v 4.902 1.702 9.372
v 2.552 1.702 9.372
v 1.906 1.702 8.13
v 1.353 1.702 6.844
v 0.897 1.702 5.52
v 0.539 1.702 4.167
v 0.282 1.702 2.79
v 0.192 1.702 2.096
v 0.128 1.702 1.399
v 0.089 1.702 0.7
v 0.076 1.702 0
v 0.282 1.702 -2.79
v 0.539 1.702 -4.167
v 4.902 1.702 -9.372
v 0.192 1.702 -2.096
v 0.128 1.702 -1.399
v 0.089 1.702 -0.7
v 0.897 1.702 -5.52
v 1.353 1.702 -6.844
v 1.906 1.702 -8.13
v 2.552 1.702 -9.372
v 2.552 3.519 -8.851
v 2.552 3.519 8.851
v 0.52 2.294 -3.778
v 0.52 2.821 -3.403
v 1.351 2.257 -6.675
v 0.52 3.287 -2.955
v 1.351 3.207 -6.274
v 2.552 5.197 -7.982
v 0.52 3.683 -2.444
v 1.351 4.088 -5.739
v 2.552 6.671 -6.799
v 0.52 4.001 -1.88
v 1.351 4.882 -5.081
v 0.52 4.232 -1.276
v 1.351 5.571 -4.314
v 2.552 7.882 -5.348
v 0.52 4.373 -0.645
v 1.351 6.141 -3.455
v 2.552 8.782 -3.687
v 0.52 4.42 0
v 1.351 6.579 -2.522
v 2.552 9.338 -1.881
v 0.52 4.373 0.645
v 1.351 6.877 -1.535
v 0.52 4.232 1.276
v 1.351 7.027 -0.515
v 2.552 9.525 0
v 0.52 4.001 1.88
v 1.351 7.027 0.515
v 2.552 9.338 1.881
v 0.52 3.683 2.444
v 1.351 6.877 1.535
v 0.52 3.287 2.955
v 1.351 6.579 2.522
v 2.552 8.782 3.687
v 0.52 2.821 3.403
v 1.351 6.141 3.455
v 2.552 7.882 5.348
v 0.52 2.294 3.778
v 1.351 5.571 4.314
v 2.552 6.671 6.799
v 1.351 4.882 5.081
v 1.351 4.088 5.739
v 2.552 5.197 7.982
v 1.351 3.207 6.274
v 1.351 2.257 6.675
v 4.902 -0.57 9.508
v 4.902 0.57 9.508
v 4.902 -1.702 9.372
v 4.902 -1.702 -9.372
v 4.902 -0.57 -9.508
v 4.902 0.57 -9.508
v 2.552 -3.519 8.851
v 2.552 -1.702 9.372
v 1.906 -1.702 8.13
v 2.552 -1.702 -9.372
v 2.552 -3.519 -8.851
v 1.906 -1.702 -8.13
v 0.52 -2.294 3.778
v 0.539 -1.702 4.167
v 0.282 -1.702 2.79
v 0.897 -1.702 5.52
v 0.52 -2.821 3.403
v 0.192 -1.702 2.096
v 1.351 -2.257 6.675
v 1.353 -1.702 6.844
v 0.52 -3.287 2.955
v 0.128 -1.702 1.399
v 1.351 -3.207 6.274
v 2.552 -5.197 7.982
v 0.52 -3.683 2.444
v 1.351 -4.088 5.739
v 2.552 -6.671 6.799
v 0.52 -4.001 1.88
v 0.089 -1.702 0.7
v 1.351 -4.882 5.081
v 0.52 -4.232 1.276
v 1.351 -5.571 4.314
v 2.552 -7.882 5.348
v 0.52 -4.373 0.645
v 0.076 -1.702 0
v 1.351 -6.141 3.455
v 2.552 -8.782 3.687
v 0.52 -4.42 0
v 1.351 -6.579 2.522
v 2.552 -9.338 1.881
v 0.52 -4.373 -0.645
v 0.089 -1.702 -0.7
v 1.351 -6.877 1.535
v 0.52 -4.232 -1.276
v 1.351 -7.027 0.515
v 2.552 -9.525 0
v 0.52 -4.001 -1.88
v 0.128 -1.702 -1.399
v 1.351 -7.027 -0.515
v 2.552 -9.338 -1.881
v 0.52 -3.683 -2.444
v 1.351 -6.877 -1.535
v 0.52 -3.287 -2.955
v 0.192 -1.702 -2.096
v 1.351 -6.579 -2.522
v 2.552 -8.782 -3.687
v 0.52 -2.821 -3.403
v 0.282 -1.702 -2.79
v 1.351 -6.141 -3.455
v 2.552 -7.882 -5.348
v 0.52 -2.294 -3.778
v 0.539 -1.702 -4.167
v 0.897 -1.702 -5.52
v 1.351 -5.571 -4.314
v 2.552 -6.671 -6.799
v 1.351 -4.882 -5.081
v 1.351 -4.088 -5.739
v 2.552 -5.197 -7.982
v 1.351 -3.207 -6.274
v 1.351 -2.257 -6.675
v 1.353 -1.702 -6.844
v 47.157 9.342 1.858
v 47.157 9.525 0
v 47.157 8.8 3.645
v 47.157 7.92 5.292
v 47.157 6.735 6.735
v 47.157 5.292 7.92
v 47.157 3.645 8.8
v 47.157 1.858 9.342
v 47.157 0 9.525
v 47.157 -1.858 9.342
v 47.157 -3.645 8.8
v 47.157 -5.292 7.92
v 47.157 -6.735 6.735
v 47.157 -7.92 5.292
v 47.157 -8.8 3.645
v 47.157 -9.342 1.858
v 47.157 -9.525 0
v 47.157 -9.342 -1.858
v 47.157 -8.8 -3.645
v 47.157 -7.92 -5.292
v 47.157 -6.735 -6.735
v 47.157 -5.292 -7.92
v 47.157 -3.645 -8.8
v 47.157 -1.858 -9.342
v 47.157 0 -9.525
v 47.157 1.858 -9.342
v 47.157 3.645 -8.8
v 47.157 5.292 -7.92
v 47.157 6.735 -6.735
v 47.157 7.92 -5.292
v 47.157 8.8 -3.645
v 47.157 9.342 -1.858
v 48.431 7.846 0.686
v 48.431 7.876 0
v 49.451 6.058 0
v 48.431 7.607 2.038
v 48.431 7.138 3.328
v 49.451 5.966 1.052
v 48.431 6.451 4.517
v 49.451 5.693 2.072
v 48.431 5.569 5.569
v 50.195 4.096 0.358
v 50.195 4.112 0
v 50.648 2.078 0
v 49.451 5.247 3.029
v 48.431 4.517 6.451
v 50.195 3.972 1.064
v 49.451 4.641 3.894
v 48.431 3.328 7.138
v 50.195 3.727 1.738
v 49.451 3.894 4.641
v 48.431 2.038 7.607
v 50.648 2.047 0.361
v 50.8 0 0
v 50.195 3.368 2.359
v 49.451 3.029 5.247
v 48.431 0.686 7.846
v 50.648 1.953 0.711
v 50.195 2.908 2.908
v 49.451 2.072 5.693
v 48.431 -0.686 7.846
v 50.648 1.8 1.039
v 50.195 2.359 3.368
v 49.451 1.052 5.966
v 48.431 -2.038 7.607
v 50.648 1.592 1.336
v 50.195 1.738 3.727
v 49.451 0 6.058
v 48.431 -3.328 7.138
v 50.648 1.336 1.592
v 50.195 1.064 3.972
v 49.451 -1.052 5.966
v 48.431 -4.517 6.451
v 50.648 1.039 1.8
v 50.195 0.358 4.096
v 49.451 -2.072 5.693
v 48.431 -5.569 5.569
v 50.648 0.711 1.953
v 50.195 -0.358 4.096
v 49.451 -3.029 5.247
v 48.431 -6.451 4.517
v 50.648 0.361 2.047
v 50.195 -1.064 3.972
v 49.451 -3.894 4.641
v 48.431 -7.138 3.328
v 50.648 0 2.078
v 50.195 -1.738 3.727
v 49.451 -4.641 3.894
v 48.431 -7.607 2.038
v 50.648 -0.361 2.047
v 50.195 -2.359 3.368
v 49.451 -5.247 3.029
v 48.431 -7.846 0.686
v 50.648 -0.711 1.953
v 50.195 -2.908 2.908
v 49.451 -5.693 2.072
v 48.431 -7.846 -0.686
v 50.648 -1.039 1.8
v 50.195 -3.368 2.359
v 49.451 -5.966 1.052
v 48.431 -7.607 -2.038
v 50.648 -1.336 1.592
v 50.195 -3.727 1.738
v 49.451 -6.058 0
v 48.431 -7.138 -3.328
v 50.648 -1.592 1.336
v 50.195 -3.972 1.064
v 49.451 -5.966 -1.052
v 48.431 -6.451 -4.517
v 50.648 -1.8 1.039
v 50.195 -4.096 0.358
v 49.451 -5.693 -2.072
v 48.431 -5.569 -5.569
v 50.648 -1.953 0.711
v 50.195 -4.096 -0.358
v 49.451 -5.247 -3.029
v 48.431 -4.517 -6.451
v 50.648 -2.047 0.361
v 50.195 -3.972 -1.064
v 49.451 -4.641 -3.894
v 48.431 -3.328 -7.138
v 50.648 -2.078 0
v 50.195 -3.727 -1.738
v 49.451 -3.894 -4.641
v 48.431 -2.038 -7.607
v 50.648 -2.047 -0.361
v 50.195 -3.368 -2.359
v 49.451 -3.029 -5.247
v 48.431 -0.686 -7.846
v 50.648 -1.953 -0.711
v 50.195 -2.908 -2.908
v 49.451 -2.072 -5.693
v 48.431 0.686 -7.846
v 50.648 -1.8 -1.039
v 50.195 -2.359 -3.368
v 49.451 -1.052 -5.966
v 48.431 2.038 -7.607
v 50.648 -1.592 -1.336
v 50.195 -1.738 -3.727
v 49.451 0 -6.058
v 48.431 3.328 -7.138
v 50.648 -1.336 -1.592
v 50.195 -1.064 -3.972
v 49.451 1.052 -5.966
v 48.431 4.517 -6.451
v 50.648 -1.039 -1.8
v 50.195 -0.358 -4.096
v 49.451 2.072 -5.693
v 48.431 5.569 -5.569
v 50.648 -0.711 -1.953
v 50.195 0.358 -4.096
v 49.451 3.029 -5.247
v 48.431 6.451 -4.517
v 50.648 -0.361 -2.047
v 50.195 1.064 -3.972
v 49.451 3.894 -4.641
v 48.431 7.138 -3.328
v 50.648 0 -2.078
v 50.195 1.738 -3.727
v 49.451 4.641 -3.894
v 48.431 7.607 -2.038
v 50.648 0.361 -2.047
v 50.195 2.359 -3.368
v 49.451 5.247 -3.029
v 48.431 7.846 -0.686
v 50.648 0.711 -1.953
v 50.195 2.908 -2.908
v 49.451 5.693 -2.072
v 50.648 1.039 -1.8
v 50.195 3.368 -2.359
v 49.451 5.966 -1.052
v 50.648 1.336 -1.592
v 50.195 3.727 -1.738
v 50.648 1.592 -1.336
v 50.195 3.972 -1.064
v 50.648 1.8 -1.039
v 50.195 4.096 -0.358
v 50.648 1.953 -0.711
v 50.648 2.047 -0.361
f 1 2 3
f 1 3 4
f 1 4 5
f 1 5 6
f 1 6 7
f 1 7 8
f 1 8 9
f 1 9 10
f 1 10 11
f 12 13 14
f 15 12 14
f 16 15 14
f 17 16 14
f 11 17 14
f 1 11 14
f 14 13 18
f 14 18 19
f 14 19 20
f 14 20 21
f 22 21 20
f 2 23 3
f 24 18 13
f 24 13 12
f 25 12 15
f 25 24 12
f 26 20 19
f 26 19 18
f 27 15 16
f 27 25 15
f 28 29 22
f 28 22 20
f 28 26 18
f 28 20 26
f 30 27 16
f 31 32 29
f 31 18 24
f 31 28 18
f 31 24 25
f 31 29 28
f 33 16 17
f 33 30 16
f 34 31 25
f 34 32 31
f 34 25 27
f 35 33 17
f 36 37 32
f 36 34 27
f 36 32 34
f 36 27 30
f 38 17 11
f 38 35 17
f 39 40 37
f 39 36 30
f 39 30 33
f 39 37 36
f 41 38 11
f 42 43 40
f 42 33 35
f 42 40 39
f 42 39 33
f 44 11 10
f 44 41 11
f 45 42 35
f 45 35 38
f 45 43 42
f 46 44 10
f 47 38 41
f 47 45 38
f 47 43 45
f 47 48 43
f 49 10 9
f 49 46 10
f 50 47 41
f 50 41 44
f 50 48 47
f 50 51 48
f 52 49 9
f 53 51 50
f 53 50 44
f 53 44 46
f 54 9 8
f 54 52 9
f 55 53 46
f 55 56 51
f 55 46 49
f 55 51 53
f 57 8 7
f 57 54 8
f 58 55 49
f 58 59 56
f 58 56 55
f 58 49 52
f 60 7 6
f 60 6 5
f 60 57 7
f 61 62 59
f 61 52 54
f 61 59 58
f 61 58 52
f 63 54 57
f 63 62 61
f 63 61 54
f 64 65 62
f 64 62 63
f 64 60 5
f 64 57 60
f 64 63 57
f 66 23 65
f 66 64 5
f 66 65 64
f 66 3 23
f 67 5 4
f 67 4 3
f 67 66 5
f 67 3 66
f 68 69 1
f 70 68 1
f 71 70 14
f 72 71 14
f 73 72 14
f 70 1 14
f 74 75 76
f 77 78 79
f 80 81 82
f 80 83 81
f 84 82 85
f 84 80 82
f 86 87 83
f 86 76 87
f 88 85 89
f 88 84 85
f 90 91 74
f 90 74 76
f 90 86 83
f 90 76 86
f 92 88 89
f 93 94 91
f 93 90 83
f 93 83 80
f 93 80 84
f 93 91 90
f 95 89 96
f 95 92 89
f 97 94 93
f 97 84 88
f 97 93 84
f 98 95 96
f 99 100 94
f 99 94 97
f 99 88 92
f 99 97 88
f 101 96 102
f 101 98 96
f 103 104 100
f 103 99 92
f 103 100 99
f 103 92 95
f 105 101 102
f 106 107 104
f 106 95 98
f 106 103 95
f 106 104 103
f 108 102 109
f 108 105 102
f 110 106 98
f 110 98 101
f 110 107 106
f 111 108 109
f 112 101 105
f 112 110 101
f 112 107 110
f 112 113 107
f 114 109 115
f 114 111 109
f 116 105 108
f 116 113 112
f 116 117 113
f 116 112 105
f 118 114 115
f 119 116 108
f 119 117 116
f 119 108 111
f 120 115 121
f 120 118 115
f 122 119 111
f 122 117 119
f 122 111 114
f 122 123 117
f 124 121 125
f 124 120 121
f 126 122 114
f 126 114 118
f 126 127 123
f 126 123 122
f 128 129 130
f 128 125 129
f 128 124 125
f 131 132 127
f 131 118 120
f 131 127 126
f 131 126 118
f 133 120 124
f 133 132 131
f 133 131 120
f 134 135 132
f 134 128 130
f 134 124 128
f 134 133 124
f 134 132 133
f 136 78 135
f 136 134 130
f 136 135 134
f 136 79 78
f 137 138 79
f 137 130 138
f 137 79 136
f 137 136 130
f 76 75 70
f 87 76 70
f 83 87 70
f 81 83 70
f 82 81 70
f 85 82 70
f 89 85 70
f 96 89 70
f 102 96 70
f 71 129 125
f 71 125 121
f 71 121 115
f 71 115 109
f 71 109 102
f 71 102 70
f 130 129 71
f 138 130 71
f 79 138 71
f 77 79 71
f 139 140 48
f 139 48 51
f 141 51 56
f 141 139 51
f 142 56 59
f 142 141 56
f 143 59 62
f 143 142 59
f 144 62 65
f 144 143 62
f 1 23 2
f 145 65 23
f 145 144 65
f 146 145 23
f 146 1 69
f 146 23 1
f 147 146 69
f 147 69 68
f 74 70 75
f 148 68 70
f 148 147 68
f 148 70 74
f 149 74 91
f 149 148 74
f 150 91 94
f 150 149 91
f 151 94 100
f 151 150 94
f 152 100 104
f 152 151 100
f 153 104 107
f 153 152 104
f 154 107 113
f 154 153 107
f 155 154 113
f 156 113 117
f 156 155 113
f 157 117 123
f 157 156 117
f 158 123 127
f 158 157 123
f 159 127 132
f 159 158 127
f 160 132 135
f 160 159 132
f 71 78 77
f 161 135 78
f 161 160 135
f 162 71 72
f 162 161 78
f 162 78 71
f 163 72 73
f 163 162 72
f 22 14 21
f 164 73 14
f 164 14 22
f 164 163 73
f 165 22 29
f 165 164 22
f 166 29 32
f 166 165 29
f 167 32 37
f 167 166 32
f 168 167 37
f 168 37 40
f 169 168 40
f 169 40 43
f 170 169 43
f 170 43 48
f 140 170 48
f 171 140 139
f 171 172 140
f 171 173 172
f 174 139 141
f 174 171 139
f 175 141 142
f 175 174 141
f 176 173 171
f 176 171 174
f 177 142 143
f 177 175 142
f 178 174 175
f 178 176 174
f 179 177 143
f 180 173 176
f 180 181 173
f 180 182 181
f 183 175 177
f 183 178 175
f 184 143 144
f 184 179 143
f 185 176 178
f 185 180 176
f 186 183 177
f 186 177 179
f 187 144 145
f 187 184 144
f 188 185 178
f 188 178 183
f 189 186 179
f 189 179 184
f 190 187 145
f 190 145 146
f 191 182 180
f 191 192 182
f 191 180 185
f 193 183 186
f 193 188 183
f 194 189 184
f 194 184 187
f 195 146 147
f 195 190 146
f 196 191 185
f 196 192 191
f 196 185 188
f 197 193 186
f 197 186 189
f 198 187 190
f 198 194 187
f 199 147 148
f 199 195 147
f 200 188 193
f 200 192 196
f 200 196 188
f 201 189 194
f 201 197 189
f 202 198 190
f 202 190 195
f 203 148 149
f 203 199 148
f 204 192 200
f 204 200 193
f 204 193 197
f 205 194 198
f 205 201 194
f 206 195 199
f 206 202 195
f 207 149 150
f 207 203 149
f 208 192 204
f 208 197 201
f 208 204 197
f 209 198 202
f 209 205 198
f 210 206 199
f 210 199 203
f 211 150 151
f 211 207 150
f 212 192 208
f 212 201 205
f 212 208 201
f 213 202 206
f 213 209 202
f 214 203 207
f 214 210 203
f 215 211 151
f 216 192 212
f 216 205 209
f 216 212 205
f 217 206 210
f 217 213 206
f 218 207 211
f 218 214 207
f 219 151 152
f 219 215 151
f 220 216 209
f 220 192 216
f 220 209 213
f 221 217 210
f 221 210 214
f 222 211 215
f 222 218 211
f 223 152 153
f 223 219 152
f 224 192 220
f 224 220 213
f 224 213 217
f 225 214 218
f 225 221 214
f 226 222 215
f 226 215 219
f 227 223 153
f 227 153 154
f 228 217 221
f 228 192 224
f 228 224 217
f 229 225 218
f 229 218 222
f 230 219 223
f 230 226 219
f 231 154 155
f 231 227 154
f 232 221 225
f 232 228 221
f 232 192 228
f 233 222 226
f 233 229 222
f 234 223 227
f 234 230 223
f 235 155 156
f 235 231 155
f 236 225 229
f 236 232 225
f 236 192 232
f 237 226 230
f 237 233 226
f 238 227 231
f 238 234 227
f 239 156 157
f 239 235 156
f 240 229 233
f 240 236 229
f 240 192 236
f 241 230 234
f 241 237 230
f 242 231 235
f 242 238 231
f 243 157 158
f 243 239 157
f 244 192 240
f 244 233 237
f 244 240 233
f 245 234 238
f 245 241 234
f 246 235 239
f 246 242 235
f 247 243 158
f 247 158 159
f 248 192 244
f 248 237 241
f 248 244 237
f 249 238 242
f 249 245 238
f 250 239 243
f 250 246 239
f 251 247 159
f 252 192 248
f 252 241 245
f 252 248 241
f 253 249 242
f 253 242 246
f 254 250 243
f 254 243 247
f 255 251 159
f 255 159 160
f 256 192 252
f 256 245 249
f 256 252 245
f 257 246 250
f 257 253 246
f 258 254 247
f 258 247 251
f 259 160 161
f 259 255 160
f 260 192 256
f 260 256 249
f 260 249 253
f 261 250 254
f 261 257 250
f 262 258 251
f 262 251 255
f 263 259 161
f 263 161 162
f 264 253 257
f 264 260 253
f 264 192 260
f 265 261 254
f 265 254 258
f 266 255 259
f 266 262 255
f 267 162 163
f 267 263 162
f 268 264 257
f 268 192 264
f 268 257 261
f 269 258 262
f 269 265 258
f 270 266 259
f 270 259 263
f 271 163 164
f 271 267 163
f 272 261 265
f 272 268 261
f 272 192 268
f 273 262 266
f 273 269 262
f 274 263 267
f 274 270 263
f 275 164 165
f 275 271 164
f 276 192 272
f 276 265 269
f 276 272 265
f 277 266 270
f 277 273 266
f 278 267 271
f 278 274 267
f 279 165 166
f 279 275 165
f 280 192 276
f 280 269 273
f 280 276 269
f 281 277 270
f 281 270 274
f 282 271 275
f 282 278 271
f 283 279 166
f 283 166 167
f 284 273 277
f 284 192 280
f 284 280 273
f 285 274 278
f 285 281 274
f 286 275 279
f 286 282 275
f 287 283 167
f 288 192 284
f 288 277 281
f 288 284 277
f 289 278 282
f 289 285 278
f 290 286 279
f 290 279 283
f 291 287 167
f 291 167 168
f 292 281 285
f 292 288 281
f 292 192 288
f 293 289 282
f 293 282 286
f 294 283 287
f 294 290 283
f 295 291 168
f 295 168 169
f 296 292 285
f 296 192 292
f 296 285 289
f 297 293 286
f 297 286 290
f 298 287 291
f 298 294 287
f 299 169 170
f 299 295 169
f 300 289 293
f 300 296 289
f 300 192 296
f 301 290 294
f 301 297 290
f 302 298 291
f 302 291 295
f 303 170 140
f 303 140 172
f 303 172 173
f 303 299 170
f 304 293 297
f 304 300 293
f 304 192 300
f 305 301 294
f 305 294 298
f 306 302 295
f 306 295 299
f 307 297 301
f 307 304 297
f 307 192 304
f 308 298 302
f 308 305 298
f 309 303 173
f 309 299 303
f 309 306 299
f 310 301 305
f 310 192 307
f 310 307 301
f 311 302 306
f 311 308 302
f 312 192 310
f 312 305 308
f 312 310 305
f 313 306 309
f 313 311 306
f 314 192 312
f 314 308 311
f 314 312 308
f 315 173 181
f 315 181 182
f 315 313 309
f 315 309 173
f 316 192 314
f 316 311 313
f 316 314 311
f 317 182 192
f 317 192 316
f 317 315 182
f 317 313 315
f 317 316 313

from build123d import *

# Parameters (mm, degrees)
SKETCH2_W  = 19.05
SKETCH2_H  = 3.4036
SLOT_DEPTH = 4.9022


with BuildPart() as part:
    # BodySke → BaseBody (revolve)
    with BuildSketch(Plane.XY):
        with BuildLine():
            Line((2.552216058, 9.525), (47.157428837, 9.525))
            ThreePointArc((47.157428837, 9.525), (49.8582952, 5.098871191), (50.8, 0))
            Line((50.8, 0), (0, 0))
            ThreePointArc((0, 0), (0.649113009, 4.930502809), (2.552216058, 9.525))
        make_face()
    revolve(axis=Axis((-12.7, 0, 0), (1, 0, 0)))

    # Sketch2 → Slot (cut)
    with BuildSketch(Plane(origin=(0, 0, 0), x_dir=(0, 0, -1), z_dir=(1, 0, 0))):
        Rectangle(SKETCH2_W, SKETCH2_H)
    extrude(amount=SLOT_DEPTH, mode=Mode.SUBTRACT)


solid = part.part
